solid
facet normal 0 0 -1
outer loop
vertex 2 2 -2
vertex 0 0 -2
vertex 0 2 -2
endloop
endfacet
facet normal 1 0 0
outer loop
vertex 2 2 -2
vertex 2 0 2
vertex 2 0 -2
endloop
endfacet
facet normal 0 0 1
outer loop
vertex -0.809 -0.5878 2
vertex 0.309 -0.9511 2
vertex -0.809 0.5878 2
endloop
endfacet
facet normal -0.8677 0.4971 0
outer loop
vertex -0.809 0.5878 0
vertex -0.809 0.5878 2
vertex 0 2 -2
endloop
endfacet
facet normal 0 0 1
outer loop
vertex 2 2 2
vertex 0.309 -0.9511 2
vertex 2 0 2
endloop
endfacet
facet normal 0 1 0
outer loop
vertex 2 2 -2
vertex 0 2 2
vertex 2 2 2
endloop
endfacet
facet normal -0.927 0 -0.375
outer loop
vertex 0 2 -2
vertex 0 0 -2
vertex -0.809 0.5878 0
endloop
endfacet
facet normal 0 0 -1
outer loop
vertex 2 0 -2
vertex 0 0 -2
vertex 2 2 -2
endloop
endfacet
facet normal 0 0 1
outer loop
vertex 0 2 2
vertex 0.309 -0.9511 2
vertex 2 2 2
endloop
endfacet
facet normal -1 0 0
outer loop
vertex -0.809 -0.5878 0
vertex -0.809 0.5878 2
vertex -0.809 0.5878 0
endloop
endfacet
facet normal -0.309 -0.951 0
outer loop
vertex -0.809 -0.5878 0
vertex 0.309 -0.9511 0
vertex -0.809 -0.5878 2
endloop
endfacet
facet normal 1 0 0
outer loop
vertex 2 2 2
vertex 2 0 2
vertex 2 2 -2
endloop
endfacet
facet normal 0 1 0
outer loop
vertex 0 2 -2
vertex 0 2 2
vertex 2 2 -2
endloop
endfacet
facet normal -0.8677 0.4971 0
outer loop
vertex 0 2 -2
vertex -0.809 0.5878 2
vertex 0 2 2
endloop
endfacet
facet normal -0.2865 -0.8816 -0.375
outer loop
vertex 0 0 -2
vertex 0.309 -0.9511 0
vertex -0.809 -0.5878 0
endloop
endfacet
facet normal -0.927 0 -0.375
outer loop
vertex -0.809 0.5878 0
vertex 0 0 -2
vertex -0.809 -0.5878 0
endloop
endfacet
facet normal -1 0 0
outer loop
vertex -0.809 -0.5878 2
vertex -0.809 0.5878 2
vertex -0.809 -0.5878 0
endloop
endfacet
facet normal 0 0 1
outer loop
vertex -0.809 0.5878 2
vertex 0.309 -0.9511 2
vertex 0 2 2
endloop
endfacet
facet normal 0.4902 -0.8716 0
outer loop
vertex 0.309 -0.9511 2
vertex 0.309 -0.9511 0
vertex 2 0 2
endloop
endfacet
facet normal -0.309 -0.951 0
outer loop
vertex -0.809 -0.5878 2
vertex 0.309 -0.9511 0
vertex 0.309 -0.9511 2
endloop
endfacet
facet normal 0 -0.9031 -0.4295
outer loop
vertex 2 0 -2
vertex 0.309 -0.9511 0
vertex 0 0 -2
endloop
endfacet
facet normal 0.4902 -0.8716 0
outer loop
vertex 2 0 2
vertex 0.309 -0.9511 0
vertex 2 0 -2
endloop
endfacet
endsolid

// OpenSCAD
module badplate(h=4) {
  //children();
  hull(){
    intersection(){
      children();
      translate([0,0,0]) #cube([h,h,h],center=true);
    }
  }
}
badplate() {
    cylinder(h=5,r=1);
    translate([0,0,-3]) cube([4,2,8]);
}

 *hull(){
    intersection(){
      cylinder(h=5,r=1);
    translate([0,0,-3]) cube([4,2,8]);
      translate([0,0,0]) cube([4,4,4],center=true);
    }
  }
/*cylinder(h=5,r=1);
    translate([0,0,-3]) cube([4,2,8]);*/
